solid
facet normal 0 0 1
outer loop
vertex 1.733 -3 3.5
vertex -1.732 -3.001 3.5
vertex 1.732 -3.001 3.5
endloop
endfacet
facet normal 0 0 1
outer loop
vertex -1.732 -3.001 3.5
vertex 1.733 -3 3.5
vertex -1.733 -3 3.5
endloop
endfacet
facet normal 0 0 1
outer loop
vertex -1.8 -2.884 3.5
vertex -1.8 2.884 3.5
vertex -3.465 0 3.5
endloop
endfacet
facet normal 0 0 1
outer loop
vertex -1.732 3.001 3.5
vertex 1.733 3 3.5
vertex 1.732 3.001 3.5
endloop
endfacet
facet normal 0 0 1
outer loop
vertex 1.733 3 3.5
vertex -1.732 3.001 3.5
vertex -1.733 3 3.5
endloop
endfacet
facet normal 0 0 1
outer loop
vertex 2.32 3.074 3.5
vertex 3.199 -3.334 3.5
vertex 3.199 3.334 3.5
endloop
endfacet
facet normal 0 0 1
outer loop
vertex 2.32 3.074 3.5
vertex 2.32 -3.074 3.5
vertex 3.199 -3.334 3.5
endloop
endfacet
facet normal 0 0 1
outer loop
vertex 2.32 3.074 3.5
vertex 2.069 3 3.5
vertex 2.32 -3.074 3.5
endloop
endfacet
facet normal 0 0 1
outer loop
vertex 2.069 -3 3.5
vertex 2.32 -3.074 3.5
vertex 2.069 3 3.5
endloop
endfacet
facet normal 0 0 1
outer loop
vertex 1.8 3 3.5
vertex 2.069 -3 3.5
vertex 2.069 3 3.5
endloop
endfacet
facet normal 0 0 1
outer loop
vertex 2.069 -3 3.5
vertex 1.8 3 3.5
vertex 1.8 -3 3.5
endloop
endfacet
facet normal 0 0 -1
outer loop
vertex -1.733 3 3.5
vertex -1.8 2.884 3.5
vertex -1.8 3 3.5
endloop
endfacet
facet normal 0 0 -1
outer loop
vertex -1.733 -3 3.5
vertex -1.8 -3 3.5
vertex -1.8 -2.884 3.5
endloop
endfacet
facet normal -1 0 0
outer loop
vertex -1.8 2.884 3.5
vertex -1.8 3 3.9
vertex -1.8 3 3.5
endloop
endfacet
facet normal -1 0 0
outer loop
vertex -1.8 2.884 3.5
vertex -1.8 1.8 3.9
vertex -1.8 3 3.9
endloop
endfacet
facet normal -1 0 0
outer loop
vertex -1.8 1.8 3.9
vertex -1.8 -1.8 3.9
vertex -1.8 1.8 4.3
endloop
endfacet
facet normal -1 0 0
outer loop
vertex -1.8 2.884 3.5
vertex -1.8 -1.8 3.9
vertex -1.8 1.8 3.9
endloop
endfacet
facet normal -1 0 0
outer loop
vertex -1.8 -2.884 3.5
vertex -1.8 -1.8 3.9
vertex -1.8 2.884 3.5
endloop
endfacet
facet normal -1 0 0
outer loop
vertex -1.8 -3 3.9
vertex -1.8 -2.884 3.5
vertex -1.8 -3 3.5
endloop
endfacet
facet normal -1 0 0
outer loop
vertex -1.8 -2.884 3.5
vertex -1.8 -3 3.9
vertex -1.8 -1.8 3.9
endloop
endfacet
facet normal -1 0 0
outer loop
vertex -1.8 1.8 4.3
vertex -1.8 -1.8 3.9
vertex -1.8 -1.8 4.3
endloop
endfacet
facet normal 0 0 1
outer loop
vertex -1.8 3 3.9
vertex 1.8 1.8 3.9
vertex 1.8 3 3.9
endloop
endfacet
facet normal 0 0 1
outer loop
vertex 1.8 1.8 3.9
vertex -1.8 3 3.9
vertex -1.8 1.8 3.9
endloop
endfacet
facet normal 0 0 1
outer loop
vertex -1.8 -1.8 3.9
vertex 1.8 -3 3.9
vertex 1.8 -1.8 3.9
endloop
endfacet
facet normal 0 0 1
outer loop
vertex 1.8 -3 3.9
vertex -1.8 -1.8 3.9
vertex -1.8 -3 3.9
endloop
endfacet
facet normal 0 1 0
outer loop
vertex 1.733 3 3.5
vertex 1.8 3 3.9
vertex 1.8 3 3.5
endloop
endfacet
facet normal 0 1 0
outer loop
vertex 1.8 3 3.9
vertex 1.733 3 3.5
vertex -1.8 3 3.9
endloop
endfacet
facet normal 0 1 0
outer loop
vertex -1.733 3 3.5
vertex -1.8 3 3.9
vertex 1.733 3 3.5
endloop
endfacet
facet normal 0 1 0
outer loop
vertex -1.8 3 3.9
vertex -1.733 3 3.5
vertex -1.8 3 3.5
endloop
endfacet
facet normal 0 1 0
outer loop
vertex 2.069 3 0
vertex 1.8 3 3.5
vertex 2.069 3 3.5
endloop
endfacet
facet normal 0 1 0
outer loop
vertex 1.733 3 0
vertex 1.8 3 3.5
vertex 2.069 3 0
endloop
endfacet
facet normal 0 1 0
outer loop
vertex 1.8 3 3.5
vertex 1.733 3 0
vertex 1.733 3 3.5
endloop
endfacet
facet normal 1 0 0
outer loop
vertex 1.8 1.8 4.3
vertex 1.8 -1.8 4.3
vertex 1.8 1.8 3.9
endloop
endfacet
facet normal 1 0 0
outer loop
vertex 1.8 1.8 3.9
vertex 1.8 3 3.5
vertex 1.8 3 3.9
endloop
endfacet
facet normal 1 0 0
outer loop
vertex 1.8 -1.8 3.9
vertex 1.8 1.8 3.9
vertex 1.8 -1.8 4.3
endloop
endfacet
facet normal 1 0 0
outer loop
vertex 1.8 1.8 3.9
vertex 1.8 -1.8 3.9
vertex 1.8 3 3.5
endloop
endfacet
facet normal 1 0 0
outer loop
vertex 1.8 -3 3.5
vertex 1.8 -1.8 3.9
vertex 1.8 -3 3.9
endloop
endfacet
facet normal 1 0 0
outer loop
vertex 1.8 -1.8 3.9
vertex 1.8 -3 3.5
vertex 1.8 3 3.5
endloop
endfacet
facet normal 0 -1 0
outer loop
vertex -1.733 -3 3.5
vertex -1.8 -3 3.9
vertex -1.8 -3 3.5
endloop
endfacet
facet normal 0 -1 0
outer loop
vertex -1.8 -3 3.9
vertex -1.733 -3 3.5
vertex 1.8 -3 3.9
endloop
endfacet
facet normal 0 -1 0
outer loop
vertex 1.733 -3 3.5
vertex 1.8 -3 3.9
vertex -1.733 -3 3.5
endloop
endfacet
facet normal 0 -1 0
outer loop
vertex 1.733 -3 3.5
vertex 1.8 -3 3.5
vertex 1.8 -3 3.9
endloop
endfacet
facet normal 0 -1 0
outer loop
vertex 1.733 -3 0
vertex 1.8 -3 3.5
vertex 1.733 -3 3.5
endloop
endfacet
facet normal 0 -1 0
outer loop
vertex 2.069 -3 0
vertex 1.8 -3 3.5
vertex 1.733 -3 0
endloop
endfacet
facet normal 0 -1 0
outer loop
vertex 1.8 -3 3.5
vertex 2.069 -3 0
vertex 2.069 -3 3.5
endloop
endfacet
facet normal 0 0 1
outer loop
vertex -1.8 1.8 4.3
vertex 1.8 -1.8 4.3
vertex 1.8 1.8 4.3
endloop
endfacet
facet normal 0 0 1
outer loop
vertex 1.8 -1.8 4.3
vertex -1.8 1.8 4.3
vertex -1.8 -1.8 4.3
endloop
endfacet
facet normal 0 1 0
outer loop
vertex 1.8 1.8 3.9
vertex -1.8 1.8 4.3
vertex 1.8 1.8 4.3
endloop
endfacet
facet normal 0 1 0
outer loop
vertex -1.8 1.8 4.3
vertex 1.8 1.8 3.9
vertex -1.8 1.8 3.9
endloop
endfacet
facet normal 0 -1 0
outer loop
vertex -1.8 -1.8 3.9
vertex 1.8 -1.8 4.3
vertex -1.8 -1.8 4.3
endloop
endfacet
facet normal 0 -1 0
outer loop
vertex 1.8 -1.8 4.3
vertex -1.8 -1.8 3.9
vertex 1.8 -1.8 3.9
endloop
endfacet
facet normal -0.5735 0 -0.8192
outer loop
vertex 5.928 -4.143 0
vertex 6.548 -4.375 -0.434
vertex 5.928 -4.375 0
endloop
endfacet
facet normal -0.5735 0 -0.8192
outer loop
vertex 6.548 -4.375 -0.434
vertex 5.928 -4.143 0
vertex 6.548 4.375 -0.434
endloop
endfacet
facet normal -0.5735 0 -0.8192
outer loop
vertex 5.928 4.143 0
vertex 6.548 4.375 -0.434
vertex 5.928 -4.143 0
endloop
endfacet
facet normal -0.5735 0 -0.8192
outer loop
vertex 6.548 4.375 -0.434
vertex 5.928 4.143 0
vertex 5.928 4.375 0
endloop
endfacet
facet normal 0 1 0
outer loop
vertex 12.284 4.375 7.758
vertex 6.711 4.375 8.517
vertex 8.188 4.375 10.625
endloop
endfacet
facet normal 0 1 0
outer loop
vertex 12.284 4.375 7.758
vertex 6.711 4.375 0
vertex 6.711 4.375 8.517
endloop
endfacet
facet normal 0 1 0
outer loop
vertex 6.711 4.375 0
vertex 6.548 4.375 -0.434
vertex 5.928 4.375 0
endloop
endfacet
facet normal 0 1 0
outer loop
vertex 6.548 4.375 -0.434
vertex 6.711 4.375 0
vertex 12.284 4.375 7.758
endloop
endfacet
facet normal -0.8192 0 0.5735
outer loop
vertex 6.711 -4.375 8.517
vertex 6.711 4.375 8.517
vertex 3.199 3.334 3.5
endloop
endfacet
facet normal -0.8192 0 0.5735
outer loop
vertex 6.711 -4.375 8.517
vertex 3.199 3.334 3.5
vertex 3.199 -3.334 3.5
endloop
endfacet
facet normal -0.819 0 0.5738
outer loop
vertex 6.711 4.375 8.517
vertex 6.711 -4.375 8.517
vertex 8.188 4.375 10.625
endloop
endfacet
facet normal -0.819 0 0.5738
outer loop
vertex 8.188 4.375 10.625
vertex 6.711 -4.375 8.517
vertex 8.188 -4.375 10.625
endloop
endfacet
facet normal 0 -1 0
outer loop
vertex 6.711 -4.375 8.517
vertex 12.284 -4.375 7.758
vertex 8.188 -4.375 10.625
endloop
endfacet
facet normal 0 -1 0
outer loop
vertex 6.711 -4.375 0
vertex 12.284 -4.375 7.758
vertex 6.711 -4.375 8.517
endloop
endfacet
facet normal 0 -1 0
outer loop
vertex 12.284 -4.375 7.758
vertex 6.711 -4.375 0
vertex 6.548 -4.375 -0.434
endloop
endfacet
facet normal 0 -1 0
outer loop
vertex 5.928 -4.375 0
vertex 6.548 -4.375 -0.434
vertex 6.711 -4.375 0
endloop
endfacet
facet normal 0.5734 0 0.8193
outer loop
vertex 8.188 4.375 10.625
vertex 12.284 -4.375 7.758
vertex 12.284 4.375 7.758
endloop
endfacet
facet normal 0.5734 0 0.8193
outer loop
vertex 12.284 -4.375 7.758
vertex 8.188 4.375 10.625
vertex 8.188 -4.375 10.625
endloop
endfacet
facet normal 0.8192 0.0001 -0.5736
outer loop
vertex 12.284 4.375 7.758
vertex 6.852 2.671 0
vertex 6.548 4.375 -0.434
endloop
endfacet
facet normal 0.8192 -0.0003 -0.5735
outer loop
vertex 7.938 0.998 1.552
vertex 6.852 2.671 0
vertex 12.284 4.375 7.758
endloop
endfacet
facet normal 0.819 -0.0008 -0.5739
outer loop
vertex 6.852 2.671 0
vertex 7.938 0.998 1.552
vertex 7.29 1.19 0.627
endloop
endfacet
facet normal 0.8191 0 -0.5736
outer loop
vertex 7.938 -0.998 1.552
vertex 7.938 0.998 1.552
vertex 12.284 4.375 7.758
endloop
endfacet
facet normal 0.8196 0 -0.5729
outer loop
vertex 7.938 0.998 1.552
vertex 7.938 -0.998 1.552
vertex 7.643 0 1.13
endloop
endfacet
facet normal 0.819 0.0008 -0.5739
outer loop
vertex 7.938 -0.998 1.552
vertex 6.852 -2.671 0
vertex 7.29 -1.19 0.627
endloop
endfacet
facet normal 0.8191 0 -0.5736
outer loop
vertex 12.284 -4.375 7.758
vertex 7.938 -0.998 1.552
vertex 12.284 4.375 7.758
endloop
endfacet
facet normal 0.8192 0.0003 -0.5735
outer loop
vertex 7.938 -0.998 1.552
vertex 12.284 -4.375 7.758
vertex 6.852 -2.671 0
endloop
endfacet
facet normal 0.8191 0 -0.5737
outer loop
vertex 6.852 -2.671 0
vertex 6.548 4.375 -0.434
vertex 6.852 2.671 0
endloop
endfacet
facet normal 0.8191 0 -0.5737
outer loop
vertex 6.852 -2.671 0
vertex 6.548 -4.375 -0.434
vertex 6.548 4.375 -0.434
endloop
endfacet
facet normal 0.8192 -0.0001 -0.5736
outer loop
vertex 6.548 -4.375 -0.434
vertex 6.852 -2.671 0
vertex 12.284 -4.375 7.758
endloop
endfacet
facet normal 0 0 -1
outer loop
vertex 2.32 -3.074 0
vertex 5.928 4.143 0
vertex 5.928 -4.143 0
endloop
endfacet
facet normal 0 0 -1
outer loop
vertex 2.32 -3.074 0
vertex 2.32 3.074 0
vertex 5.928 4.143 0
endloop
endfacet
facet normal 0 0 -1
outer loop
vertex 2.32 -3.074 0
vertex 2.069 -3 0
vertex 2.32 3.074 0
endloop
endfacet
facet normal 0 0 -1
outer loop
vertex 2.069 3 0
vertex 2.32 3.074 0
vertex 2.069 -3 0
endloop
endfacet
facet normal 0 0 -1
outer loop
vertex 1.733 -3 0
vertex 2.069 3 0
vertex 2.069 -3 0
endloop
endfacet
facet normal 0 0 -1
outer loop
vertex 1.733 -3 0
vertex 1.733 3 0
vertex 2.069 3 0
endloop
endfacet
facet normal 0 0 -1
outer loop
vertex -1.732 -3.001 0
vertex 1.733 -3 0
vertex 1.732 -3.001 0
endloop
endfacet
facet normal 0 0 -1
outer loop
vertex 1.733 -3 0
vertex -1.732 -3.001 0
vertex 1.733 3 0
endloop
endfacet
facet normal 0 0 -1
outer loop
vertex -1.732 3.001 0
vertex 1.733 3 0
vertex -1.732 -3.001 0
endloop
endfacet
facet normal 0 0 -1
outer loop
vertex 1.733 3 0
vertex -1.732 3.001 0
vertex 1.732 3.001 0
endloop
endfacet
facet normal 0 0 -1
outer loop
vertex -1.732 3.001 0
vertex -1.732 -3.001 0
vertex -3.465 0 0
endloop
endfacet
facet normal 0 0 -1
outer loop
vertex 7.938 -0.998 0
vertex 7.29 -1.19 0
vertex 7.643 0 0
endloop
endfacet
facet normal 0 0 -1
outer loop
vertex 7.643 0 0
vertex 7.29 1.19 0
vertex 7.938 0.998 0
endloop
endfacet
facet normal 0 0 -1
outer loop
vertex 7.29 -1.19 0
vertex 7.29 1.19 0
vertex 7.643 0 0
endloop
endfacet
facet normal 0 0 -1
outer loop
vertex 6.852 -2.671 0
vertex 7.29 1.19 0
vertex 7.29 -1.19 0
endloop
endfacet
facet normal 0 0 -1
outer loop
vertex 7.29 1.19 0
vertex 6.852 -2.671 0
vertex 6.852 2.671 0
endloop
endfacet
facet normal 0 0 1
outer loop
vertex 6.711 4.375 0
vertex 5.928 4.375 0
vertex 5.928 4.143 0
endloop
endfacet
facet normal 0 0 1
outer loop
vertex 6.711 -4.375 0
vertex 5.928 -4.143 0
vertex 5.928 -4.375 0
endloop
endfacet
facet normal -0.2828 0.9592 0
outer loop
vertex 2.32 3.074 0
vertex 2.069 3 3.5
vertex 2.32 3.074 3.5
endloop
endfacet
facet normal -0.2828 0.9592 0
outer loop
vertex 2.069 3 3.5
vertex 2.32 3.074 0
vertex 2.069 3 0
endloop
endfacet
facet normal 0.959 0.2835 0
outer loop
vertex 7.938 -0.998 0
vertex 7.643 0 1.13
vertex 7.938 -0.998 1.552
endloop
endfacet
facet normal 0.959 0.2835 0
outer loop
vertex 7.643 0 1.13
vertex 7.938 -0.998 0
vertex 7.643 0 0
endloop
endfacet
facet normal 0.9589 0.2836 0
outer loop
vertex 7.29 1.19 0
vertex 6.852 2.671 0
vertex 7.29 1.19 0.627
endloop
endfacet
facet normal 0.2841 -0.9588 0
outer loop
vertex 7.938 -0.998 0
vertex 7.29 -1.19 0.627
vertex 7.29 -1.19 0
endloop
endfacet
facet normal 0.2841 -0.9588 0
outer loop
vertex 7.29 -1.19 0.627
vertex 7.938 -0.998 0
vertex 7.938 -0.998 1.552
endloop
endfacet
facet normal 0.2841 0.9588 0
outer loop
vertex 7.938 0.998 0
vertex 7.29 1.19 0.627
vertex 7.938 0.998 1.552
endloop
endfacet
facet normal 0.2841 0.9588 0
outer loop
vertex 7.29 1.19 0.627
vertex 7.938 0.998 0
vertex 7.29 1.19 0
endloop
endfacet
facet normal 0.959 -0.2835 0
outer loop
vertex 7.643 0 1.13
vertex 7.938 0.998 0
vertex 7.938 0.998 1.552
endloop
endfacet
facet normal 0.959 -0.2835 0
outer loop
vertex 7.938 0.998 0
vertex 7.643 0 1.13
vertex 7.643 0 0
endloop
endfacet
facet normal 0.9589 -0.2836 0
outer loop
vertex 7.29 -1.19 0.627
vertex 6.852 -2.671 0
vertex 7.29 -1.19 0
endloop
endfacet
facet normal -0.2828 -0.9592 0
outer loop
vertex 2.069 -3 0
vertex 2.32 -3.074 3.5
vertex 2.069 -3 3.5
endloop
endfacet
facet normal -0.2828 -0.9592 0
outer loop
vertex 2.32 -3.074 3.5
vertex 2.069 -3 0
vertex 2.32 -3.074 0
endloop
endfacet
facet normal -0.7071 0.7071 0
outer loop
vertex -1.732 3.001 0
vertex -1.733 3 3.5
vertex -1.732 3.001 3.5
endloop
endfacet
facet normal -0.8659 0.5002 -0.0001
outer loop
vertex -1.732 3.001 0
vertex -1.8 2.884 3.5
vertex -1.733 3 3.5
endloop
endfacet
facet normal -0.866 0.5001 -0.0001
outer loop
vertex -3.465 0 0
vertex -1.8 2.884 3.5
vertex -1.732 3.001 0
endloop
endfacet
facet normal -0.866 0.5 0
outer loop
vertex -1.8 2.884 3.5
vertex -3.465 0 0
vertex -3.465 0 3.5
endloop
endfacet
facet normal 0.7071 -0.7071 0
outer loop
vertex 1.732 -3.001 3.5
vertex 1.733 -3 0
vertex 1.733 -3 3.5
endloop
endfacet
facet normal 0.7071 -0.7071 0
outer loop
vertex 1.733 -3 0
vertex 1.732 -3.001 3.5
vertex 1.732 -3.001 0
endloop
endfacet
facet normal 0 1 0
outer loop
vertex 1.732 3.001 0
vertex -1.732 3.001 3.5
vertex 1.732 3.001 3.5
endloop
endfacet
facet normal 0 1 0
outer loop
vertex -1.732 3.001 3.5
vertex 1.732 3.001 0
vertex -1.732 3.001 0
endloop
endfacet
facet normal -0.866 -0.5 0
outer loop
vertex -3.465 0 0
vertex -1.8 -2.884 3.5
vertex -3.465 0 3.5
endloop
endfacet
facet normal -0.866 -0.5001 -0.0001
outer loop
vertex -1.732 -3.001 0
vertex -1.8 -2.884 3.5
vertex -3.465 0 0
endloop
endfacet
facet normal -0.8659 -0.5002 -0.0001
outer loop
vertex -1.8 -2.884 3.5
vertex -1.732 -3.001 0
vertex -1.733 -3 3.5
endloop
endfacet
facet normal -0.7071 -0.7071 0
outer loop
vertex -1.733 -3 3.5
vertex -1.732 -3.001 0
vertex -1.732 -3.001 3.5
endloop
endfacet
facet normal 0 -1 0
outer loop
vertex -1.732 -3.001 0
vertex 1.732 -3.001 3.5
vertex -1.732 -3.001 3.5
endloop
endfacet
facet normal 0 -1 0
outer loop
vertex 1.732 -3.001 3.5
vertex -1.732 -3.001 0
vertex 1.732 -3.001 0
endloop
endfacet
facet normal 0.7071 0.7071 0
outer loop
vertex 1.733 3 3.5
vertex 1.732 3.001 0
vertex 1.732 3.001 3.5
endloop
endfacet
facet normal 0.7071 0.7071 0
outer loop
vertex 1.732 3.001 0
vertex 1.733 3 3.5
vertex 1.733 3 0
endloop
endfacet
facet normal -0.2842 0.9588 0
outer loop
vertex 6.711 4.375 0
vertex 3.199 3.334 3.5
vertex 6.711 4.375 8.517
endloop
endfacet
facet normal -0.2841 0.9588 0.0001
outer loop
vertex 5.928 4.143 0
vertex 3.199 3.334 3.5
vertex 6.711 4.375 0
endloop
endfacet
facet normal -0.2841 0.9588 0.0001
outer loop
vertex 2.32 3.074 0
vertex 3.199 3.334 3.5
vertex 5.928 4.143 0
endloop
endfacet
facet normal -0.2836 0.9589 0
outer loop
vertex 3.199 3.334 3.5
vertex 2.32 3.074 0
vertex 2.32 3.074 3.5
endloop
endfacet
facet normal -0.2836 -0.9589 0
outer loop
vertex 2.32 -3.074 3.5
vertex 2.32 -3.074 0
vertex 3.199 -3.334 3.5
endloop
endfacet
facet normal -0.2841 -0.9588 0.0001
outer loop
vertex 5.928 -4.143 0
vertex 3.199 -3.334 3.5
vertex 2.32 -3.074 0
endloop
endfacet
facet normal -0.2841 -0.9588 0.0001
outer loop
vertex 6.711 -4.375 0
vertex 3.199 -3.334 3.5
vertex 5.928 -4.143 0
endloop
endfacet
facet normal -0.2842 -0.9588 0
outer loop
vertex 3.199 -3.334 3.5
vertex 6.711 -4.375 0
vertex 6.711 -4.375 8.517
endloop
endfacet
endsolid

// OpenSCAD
layer_height=0.2;
screw_w=3.6;

difference(){
            union(){
                translate([32.5-33+5,0,1]) rotate([0,35,0]) linear_extrude(10) square([5,8.75], center=true);
                    translate([5,1,0]) translate([0,0,0]) rotate([0,0,16.5]) linear_extrude(3.5) square([4.5,5.5], center=true);
                    translate([5,-1,0]) rotate([0,0,-16.5]) linear_extrude(3.5) square([4.5,5.5], center=true);
                
                    translate([3.75,0,0]) linear_extrude(3.5) square([4.5,6], center=true);
            translate([0,0,0]) linear_extrude(3.5)circle(d=6.93, $fn=6);
                    translate([0,0,3.5]){
    linear_extrude(layer_height*2) square([screw_w,6], center =true);
    linear_extrude(layer_height*4) square([screw_w,screw_w], center=true);
                    }
                }
                translate([4,0+6.204,0]) rotate([0,0,16.5]) linear_extrude(10) square([5,5.0475], center=true);
                translate([4,0-6.204,0]) rotate([0,0,-16.5]) linear_extrude(10) square([5,5.0475], center=true);

        }
    
